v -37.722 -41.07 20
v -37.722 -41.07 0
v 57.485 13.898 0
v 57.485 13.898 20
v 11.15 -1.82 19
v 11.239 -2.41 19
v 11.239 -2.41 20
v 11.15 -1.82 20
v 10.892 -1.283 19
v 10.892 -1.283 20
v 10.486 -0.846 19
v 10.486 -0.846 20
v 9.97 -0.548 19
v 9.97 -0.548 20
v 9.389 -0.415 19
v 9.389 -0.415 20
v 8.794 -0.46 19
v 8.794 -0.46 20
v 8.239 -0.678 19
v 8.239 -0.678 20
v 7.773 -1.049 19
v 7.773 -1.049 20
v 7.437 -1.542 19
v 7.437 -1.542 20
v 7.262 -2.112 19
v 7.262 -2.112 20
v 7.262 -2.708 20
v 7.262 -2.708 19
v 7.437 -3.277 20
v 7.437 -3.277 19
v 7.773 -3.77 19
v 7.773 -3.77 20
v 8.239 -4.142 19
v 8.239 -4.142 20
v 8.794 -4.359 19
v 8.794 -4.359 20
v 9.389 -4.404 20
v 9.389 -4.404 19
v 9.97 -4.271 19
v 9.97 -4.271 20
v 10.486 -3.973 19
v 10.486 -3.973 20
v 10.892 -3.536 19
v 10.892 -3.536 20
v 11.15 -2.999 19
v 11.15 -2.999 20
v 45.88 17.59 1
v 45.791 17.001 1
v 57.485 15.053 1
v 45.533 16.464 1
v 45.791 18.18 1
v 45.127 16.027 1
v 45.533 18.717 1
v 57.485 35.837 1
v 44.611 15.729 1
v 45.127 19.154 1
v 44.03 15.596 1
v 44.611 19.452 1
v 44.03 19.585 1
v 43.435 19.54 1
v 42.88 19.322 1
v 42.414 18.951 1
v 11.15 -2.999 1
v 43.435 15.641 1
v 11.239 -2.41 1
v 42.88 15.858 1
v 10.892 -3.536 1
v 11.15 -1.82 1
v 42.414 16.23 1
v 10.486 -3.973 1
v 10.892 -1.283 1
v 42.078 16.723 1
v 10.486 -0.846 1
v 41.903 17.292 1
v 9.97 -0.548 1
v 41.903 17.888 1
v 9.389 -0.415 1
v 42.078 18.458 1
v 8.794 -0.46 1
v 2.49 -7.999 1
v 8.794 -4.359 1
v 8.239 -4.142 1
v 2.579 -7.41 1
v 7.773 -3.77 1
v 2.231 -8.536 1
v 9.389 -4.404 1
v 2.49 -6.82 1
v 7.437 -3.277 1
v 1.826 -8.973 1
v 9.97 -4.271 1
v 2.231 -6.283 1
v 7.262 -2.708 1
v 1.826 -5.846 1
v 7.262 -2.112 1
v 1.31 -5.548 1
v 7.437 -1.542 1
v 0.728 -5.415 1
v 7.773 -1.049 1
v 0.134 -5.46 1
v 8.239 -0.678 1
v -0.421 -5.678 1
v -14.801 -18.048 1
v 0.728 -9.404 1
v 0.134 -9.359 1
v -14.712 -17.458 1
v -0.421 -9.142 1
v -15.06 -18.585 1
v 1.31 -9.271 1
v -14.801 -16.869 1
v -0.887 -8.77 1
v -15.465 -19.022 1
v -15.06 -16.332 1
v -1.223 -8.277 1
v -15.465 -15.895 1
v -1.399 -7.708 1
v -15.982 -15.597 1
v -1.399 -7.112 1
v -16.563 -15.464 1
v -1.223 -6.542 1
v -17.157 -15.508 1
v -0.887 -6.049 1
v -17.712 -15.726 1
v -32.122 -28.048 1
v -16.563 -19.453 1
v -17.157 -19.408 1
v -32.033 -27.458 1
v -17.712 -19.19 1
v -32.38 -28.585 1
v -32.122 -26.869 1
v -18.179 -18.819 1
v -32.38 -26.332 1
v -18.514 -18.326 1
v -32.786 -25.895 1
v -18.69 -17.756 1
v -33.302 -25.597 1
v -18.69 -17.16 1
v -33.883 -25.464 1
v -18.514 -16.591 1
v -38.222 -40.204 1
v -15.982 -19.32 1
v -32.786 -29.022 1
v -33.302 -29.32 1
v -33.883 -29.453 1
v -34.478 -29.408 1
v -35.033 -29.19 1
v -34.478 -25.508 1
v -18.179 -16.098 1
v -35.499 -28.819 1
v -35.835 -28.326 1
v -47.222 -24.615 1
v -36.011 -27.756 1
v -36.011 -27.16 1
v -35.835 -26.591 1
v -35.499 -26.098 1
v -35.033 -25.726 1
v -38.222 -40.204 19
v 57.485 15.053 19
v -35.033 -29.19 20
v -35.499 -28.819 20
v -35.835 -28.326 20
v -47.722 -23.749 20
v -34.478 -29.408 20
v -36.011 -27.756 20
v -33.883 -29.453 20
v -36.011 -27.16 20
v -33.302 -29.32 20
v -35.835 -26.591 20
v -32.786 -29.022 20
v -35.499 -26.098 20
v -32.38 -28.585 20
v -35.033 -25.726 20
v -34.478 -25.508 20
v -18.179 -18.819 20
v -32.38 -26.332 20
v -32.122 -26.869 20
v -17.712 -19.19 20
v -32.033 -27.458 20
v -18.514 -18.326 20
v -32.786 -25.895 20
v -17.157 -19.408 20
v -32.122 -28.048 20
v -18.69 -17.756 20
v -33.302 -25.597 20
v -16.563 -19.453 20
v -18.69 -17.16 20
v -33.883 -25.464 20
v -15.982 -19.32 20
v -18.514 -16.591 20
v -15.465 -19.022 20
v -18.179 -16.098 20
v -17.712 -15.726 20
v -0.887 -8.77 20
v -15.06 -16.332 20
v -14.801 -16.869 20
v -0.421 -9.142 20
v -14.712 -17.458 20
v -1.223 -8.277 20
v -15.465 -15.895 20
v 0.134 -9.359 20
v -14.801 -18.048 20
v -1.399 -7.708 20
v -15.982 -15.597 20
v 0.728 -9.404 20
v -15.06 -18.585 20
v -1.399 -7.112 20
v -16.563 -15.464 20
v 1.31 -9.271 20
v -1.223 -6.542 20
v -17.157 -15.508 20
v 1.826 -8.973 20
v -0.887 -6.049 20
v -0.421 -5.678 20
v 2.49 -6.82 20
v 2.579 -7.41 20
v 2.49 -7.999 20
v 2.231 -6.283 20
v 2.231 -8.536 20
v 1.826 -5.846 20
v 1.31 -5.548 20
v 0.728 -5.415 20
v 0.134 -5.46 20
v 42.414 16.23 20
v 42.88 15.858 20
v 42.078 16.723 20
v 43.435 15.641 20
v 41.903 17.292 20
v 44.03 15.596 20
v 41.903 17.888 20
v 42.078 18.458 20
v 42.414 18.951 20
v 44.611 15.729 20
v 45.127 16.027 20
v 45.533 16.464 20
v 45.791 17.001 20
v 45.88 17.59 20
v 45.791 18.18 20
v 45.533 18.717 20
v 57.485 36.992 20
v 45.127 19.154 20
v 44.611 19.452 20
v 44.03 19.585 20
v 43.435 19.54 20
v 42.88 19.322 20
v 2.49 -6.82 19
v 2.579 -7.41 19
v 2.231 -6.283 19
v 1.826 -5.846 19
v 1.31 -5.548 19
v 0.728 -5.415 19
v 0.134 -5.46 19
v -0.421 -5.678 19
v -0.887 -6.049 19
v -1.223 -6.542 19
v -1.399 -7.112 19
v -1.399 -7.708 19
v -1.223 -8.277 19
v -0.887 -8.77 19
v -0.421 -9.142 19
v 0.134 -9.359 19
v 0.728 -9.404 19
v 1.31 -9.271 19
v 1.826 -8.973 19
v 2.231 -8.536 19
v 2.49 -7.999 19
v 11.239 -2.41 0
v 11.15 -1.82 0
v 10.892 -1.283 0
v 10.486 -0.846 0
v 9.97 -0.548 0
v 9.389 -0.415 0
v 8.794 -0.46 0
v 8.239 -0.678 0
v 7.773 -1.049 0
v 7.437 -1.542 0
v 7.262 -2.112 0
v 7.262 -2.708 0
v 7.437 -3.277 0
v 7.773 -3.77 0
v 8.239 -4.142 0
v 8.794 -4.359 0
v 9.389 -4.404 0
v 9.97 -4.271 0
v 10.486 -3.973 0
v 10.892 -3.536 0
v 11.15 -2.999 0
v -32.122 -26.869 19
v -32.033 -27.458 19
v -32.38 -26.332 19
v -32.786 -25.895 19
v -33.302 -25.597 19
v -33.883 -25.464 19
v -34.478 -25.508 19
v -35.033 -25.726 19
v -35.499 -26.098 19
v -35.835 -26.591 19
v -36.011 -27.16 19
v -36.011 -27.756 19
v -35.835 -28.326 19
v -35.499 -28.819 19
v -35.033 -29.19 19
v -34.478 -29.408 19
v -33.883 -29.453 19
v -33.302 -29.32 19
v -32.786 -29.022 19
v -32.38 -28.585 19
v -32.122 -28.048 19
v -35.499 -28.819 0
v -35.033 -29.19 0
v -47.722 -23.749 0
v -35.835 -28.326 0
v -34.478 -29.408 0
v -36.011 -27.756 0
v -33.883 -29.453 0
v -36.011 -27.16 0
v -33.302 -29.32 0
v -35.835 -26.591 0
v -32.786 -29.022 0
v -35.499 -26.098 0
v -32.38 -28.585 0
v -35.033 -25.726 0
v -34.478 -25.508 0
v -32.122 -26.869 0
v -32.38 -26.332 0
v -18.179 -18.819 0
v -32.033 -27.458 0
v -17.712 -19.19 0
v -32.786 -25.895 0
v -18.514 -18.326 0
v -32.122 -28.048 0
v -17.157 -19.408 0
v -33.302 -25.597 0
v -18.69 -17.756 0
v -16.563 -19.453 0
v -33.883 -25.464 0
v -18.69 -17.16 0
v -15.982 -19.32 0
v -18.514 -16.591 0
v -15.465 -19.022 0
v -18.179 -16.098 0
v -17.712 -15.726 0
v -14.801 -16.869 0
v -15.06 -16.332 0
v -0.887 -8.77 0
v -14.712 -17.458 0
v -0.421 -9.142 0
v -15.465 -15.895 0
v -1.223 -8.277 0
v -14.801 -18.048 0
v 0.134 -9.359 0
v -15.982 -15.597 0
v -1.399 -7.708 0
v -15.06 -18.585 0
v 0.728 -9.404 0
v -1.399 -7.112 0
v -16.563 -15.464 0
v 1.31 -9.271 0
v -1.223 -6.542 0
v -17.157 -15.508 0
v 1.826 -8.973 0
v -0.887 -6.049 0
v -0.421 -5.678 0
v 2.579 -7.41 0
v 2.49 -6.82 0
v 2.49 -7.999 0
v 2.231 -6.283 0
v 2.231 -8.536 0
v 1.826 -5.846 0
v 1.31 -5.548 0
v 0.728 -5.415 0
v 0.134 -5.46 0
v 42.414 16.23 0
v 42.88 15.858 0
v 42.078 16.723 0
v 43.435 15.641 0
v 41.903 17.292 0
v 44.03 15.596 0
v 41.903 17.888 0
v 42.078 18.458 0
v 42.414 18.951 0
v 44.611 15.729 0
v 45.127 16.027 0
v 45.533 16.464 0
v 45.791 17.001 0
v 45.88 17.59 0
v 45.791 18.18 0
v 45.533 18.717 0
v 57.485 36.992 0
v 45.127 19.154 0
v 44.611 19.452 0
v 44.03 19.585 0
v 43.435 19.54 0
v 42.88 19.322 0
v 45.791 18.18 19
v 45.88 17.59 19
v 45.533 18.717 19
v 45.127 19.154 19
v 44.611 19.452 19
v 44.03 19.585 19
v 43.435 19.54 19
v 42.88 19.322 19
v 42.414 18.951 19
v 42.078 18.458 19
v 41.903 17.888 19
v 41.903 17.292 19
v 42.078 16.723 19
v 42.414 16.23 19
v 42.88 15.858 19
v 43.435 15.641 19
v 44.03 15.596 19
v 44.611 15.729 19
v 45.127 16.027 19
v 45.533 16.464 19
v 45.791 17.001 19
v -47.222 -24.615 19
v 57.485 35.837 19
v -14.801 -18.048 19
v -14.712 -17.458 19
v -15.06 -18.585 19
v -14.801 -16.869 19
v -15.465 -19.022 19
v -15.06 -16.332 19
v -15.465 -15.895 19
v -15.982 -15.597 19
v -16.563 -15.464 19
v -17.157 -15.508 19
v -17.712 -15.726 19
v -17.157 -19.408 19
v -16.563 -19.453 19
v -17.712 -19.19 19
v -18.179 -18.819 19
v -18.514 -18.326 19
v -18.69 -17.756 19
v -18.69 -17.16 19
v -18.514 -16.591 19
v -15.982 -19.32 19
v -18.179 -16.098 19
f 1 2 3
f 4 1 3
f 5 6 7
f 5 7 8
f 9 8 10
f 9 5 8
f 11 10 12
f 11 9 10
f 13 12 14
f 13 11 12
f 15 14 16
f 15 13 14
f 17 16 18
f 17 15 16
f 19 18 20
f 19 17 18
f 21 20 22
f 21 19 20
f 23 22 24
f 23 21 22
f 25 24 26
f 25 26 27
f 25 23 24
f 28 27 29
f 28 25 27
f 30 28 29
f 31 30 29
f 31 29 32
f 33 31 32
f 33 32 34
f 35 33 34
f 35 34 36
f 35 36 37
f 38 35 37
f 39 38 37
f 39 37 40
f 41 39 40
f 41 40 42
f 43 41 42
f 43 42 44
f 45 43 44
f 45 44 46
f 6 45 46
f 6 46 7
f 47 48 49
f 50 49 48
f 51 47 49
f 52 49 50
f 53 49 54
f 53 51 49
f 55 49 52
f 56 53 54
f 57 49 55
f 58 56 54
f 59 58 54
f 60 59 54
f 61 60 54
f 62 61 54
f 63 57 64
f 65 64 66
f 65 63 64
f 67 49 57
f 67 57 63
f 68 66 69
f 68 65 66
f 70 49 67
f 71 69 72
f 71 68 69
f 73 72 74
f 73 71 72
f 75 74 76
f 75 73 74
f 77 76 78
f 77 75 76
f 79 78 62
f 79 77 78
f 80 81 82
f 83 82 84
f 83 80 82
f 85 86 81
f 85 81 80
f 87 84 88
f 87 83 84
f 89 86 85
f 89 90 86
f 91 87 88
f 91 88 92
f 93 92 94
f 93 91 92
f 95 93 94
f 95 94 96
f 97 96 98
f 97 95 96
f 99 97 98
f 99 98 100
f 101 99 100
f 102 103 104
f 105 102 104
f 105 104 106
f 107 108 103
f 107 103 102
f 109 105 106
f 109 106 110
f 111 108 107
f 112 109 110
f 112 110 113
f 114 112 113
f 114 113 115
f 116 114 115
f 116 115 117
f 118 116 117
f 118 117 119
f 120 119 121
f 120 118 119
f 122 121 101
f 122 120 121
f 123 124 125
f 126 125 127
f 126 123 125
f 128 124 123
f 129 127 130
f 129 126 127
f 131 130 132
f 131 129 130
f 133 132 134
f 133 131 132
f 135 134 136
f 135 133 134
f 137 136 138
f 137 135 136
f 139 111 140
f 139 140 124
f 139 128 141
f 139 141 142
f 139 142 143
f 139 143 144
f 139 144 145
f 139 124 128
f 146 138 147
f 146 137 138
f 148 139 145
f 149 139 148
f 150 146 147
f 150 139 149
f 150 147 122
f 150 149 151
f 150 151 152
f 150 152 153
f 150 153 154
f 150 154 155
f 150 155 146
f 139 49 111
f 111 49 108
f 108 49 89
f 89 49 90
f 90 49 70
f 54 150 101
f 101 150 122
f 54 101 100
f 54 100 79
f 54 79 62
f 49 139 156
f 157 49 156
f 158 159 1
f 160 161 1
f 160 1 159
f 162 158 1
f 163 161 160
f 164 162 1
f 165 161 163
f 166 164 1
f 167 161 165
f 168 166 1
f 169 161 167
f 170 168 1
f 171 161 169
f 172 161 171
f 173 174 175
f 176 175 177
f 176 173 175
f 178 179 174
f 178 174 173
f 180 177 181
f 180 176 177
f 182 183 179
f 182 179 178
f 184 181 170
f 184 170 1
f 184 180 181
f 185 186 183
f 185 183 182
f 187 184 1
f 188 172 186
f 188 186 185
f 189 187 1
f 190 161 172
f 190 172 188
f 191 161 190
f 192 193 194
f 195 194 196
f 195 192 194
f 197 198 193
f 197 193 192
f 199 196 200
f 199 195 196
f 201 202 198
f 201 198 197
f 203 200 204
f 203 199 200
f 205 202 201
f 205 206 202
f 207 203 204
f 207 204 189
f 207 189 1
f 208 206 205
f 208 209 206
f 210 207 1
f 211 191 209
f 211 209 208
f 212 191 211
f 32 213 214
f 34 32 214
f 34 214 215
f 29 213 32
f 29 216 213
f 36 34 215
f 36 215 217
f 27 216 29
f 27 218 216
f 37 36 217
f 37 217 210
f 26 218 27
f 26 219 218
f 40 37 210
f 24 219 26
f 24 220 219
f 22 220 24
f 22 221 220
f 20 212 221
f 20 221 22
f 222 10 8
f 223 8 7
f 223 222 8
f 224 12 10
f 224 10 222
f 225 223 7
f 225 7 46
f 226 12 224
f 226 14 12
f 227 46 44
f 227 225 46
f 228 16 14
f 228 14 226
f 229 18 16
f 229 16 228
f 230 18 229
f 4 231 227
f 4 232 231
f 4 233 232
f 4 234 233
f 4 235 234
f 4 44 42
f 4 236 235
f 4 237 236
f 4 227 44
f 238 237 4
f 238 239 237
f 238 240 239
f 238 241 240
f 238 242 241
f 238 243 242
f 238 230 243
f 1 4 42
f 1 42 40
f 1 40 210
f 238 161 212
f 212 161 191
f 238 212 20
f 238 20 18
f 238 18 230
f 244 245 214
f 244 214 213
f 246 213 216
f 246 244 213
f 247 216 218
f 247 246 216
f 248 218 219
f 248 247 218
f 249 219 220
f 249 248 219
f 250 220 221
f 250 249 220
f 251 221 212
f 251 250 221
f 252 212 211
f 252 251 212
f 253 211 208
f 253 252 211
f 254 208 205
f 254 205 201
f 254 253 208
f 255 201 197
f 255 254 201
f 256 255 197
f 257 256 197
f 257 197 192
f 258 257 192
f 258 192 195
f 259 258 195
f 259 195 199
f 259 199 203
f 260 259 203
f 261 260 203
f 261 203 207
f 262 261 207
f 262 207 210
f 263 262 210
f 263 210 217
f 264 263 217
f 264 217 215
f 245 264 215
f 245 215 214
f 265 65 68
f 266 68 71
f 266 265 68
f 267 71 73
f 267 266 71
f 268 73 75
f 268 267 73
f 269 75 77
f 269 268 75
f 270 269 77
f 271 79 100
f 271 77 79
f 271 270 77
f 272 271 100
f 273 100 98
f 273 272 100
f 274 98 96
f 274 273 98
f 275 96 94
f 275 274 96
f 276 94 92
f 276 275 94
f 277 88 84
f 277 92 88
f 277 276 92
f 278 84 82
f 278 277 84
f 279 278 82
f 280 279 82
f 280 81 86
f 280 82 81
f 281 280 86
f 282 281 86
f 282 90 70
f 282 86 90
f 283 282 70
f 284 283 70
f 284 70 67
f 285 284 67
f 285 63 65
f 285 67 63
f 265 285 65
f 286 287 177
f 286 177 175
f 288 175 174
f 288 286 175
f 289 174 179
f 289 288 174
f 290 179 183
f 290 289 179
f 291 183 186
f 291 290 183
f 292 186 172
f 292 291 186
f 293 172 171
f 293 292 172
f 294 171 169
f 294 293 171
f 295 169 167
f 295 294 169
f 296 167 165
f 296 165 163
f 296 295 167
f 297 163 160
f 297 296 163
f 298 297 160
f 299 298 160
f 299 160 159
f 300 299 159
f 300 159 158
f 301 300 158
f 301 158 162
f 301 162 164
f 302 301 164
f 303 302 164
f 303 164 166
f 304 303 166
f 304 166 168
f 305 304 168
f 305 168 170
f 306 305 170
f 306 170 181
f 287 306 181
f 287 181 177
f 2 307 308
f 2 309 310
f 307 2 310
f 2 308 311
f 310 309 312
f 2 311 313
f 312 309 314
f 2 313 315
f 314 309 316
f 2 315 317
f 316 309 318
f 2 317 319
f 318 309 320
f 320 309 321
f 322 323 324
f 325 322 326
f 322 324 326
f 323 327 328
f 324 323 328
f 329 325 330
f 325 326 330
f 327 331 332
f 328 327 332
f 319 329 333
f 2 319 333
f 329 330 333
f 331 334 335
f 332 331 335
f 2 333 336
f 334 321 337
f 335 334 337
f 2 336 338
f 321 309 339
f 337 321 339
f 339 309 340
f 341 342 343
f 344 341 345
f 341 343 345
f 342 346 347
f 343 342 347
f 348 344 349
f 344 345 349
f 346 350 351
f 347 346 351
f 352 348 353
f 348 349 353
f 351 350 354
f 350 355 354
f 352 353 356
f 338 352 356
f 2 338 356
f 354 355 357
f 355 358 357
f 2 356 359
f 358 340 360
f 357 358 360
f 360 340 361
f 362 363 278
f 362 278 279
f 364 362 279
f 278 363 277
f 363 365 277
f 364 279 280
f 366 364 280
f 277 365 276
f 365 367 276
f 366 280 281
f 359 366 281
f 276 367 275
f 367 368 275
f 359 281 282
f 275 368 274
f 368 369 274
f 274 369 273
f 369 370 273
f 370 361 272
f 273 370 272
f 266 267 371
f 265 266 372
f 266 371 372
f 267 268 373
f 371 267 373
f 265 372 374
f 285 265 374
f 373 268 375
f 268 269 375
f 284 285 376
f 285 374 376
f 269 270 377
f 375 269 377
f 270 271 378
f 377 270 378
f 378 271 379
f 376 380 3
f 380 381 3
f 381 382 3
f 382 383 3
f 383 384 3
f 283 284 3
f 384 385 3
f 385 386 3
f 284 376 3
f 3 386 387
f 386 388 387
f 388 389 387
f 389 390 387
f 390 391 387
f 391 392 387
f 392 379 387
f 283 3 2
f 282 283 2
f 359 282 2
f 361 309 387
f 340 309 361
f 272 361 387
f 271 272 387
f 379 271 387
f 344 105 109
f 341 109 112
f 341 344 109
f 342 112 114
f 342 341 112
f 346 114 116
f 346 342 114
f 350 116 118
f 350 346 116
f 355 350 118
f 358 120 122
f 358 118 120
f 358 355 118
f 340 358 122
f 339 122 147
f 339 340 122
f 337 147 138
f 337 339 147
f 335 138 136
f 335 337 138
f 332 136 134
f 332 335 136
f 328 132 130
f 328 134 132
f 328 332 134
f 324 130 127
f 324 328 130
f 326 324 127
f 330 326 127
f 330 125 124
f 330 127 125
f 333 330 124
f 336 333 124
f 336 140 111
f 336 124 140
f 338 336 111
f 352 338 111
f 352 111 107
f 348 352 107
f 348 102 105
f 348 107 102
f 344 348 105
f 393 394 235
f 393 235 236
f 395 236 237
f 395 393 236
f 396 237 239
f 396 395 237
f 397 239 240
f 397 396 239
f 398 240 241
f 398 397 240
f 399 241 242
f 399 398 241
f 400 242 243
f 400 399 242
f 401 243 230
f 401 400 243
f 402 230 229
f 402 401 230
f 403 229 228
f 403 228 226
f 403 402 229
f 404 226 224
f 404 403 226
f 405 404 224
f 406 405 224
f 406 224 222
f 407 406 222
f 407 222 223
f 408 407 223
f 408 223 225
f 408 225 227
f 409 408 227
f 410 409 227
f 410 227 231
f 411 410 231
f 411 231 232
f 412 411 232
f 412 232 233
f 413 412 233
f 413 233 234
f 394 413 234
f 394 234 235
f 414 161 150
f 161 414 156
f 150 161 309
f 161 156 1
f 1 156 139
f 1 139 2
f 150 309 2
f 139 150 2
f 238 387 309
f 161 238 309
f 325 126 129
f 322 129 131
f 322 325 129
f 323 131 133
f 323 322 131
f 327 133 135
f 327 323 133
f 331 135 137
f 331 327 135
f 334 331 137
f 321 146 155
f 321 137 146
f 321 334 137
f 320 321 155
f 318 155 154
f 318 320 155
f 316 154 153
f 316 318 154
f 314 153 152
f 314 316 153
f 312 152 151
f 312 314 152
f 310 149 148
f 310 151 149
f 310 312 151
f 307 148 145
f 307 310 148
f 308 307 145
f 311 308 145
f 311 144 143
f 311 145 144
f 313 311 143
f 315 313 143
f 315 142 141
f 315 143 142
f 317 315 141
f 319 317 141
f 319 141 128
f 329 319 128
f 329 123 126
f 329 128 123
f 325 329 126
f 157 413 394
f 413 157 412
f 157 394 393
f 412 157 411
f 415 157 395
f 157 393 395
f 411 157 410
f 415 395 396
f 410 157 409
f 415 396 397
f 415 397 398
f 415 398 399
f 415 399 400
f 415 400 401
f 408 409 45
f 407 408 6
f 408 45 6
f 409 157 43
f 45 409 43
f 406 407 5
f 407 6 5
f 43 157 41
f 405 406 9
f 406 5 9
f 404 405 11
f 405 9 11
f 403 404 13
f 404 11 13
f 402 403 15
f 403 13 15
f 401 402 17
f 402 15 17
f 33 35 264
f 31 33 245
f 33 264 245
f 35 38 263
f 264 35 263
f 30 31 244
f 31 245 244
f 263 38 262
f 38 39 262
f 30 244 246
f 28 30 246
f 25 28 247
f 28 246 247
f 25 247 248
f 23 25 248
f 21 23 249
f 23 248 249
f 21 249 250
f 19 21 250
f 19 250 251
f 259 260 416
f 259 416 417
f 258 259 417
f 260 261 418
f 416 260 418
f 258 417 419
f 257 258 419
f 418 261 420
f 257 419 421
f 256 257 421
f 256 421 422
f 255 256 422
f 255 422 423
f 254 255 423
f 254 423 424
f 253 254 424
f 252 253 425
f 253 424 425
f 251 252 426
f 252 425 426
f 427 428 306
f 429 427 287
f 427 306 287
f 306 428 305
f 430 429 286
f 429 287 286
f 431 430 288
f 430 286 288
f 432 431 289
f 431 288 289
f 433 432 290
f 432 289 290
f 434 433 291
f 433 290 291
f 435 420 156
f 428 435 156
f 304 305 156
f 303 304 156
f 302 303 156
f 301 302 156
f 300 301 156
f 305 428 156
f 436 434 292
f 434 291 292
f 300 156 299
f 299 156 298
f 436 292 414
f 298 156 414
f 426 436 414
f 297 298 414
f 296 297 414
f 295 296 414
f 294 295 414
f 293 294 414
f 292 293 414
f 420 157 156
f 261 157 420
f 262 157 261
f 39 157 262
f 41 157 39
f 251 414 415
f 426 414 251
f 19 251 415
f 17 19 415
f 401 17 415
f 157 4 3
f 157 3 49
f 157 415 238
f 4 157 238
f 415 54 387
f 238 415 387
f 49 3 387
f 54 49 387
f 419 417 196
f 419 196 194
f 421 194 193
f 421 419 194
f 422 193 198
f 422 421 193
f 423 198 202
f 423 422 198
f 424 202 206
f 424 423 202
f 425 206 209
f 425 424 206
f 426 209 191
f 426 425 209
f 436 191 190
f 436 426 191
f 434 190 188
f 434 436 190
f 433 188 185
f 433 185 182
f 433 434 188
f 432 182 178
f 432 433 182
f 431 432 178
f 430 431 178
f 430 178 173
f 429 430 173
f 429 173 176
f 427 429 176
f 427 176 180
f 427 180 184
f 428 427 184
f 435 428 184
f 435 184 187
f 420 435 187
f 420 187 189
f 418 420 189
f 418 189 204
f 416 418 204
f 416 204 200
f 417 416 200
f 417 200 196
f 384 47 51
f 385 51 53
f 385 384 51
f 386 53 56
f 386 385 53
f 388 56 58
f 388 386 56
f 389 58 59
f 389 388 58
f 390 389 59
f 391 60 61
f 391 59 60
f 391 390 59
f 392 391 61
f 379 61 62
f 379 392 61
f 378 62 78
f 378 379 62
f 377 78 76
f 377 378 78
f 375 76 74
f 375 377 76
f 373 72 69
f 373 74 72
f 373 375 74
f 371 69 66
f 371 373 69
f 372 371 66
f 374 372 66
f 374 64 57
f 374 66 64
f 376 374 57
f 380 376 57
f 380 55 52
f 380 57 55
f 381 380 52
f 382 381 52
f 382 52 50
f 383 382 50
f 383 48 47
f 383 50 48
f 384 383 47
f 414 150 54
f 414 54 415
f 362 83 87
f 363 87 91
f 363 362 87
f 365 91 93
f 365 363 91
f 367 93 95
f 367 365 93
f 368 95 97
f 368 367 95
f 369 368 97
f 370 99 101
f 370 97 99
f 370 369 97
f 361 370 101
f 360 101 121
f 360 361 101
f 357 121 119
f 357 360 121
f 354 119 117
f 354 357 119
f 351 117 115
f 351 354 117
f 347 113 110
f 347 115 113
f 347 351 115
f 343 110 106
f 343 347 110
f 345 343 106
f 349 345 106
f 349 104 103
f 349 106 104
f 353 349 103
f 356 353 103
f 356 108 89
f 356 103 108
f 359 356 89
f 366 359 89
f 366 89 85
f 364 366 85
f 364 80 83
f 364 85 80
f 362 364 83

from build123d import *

# Parameters (mm, degrees)
SKETCH_1_R          = 2
EXTRUDE_1_DEPTH     = 20
SKETCH_2_W          = 18
SKETCH_2_H          = 18
CUT_EXTRUDE_1_DEPTH = 124.162075769


with BuildPart() as part:
    # 草图1 → 凸台-拉伸1 (new body)
    with BuildSketch(Plane.XY):
        Polygon((-47.722320689, -23.749341584), (-37.722320689, -41.06984966), (57.484792643, 13.898002851), (57.484792643, 36.992013619), align=None)
        with Locations((43.880219689, 17.590404378)):
            Circle(SKETCH_1_R, mode=Mode.SUBTRACT)
        with Locations((9.239203538, -2.409595622)):
            Circle(SKETCH_1_R, mode=Mode.SUBTRACT)
        with Locations((0.5789495, -7.409595622)):
            Circle(SKETCH_1_R, mode=Mode.SUBTRACT)
        with Locations((-16.712437168, -17.458303329)):
            Circle(SKETCH_1_R, mode=Mode.SUBTRACT)
        with Locations((-34.032945243, -27.458303329)):
            Circle(SKETCH_1_R, mode=Mode.SUBTRACT)
    extrude(amount=EXTRUDE_1_DEPTH)

    # 草图2 → 切除-拉伸1 (cut, through all)
    with BuildSketch(Plane(origin=(-46.075507084, -26.601706418, 0), x_dir=(0, 0, 1), z_dir=(-0.8660254037844416, -0.49999999999999517, 0))):
        with Locations((10, -6.70637279)):
            Rectangle(SKETCH_2_W, SKETCH_2_H)
    extrude(amount=-CUT_EXTRUDE_1_DEPTH, mode=Mode.SUBTRACT)


solid = part.part
